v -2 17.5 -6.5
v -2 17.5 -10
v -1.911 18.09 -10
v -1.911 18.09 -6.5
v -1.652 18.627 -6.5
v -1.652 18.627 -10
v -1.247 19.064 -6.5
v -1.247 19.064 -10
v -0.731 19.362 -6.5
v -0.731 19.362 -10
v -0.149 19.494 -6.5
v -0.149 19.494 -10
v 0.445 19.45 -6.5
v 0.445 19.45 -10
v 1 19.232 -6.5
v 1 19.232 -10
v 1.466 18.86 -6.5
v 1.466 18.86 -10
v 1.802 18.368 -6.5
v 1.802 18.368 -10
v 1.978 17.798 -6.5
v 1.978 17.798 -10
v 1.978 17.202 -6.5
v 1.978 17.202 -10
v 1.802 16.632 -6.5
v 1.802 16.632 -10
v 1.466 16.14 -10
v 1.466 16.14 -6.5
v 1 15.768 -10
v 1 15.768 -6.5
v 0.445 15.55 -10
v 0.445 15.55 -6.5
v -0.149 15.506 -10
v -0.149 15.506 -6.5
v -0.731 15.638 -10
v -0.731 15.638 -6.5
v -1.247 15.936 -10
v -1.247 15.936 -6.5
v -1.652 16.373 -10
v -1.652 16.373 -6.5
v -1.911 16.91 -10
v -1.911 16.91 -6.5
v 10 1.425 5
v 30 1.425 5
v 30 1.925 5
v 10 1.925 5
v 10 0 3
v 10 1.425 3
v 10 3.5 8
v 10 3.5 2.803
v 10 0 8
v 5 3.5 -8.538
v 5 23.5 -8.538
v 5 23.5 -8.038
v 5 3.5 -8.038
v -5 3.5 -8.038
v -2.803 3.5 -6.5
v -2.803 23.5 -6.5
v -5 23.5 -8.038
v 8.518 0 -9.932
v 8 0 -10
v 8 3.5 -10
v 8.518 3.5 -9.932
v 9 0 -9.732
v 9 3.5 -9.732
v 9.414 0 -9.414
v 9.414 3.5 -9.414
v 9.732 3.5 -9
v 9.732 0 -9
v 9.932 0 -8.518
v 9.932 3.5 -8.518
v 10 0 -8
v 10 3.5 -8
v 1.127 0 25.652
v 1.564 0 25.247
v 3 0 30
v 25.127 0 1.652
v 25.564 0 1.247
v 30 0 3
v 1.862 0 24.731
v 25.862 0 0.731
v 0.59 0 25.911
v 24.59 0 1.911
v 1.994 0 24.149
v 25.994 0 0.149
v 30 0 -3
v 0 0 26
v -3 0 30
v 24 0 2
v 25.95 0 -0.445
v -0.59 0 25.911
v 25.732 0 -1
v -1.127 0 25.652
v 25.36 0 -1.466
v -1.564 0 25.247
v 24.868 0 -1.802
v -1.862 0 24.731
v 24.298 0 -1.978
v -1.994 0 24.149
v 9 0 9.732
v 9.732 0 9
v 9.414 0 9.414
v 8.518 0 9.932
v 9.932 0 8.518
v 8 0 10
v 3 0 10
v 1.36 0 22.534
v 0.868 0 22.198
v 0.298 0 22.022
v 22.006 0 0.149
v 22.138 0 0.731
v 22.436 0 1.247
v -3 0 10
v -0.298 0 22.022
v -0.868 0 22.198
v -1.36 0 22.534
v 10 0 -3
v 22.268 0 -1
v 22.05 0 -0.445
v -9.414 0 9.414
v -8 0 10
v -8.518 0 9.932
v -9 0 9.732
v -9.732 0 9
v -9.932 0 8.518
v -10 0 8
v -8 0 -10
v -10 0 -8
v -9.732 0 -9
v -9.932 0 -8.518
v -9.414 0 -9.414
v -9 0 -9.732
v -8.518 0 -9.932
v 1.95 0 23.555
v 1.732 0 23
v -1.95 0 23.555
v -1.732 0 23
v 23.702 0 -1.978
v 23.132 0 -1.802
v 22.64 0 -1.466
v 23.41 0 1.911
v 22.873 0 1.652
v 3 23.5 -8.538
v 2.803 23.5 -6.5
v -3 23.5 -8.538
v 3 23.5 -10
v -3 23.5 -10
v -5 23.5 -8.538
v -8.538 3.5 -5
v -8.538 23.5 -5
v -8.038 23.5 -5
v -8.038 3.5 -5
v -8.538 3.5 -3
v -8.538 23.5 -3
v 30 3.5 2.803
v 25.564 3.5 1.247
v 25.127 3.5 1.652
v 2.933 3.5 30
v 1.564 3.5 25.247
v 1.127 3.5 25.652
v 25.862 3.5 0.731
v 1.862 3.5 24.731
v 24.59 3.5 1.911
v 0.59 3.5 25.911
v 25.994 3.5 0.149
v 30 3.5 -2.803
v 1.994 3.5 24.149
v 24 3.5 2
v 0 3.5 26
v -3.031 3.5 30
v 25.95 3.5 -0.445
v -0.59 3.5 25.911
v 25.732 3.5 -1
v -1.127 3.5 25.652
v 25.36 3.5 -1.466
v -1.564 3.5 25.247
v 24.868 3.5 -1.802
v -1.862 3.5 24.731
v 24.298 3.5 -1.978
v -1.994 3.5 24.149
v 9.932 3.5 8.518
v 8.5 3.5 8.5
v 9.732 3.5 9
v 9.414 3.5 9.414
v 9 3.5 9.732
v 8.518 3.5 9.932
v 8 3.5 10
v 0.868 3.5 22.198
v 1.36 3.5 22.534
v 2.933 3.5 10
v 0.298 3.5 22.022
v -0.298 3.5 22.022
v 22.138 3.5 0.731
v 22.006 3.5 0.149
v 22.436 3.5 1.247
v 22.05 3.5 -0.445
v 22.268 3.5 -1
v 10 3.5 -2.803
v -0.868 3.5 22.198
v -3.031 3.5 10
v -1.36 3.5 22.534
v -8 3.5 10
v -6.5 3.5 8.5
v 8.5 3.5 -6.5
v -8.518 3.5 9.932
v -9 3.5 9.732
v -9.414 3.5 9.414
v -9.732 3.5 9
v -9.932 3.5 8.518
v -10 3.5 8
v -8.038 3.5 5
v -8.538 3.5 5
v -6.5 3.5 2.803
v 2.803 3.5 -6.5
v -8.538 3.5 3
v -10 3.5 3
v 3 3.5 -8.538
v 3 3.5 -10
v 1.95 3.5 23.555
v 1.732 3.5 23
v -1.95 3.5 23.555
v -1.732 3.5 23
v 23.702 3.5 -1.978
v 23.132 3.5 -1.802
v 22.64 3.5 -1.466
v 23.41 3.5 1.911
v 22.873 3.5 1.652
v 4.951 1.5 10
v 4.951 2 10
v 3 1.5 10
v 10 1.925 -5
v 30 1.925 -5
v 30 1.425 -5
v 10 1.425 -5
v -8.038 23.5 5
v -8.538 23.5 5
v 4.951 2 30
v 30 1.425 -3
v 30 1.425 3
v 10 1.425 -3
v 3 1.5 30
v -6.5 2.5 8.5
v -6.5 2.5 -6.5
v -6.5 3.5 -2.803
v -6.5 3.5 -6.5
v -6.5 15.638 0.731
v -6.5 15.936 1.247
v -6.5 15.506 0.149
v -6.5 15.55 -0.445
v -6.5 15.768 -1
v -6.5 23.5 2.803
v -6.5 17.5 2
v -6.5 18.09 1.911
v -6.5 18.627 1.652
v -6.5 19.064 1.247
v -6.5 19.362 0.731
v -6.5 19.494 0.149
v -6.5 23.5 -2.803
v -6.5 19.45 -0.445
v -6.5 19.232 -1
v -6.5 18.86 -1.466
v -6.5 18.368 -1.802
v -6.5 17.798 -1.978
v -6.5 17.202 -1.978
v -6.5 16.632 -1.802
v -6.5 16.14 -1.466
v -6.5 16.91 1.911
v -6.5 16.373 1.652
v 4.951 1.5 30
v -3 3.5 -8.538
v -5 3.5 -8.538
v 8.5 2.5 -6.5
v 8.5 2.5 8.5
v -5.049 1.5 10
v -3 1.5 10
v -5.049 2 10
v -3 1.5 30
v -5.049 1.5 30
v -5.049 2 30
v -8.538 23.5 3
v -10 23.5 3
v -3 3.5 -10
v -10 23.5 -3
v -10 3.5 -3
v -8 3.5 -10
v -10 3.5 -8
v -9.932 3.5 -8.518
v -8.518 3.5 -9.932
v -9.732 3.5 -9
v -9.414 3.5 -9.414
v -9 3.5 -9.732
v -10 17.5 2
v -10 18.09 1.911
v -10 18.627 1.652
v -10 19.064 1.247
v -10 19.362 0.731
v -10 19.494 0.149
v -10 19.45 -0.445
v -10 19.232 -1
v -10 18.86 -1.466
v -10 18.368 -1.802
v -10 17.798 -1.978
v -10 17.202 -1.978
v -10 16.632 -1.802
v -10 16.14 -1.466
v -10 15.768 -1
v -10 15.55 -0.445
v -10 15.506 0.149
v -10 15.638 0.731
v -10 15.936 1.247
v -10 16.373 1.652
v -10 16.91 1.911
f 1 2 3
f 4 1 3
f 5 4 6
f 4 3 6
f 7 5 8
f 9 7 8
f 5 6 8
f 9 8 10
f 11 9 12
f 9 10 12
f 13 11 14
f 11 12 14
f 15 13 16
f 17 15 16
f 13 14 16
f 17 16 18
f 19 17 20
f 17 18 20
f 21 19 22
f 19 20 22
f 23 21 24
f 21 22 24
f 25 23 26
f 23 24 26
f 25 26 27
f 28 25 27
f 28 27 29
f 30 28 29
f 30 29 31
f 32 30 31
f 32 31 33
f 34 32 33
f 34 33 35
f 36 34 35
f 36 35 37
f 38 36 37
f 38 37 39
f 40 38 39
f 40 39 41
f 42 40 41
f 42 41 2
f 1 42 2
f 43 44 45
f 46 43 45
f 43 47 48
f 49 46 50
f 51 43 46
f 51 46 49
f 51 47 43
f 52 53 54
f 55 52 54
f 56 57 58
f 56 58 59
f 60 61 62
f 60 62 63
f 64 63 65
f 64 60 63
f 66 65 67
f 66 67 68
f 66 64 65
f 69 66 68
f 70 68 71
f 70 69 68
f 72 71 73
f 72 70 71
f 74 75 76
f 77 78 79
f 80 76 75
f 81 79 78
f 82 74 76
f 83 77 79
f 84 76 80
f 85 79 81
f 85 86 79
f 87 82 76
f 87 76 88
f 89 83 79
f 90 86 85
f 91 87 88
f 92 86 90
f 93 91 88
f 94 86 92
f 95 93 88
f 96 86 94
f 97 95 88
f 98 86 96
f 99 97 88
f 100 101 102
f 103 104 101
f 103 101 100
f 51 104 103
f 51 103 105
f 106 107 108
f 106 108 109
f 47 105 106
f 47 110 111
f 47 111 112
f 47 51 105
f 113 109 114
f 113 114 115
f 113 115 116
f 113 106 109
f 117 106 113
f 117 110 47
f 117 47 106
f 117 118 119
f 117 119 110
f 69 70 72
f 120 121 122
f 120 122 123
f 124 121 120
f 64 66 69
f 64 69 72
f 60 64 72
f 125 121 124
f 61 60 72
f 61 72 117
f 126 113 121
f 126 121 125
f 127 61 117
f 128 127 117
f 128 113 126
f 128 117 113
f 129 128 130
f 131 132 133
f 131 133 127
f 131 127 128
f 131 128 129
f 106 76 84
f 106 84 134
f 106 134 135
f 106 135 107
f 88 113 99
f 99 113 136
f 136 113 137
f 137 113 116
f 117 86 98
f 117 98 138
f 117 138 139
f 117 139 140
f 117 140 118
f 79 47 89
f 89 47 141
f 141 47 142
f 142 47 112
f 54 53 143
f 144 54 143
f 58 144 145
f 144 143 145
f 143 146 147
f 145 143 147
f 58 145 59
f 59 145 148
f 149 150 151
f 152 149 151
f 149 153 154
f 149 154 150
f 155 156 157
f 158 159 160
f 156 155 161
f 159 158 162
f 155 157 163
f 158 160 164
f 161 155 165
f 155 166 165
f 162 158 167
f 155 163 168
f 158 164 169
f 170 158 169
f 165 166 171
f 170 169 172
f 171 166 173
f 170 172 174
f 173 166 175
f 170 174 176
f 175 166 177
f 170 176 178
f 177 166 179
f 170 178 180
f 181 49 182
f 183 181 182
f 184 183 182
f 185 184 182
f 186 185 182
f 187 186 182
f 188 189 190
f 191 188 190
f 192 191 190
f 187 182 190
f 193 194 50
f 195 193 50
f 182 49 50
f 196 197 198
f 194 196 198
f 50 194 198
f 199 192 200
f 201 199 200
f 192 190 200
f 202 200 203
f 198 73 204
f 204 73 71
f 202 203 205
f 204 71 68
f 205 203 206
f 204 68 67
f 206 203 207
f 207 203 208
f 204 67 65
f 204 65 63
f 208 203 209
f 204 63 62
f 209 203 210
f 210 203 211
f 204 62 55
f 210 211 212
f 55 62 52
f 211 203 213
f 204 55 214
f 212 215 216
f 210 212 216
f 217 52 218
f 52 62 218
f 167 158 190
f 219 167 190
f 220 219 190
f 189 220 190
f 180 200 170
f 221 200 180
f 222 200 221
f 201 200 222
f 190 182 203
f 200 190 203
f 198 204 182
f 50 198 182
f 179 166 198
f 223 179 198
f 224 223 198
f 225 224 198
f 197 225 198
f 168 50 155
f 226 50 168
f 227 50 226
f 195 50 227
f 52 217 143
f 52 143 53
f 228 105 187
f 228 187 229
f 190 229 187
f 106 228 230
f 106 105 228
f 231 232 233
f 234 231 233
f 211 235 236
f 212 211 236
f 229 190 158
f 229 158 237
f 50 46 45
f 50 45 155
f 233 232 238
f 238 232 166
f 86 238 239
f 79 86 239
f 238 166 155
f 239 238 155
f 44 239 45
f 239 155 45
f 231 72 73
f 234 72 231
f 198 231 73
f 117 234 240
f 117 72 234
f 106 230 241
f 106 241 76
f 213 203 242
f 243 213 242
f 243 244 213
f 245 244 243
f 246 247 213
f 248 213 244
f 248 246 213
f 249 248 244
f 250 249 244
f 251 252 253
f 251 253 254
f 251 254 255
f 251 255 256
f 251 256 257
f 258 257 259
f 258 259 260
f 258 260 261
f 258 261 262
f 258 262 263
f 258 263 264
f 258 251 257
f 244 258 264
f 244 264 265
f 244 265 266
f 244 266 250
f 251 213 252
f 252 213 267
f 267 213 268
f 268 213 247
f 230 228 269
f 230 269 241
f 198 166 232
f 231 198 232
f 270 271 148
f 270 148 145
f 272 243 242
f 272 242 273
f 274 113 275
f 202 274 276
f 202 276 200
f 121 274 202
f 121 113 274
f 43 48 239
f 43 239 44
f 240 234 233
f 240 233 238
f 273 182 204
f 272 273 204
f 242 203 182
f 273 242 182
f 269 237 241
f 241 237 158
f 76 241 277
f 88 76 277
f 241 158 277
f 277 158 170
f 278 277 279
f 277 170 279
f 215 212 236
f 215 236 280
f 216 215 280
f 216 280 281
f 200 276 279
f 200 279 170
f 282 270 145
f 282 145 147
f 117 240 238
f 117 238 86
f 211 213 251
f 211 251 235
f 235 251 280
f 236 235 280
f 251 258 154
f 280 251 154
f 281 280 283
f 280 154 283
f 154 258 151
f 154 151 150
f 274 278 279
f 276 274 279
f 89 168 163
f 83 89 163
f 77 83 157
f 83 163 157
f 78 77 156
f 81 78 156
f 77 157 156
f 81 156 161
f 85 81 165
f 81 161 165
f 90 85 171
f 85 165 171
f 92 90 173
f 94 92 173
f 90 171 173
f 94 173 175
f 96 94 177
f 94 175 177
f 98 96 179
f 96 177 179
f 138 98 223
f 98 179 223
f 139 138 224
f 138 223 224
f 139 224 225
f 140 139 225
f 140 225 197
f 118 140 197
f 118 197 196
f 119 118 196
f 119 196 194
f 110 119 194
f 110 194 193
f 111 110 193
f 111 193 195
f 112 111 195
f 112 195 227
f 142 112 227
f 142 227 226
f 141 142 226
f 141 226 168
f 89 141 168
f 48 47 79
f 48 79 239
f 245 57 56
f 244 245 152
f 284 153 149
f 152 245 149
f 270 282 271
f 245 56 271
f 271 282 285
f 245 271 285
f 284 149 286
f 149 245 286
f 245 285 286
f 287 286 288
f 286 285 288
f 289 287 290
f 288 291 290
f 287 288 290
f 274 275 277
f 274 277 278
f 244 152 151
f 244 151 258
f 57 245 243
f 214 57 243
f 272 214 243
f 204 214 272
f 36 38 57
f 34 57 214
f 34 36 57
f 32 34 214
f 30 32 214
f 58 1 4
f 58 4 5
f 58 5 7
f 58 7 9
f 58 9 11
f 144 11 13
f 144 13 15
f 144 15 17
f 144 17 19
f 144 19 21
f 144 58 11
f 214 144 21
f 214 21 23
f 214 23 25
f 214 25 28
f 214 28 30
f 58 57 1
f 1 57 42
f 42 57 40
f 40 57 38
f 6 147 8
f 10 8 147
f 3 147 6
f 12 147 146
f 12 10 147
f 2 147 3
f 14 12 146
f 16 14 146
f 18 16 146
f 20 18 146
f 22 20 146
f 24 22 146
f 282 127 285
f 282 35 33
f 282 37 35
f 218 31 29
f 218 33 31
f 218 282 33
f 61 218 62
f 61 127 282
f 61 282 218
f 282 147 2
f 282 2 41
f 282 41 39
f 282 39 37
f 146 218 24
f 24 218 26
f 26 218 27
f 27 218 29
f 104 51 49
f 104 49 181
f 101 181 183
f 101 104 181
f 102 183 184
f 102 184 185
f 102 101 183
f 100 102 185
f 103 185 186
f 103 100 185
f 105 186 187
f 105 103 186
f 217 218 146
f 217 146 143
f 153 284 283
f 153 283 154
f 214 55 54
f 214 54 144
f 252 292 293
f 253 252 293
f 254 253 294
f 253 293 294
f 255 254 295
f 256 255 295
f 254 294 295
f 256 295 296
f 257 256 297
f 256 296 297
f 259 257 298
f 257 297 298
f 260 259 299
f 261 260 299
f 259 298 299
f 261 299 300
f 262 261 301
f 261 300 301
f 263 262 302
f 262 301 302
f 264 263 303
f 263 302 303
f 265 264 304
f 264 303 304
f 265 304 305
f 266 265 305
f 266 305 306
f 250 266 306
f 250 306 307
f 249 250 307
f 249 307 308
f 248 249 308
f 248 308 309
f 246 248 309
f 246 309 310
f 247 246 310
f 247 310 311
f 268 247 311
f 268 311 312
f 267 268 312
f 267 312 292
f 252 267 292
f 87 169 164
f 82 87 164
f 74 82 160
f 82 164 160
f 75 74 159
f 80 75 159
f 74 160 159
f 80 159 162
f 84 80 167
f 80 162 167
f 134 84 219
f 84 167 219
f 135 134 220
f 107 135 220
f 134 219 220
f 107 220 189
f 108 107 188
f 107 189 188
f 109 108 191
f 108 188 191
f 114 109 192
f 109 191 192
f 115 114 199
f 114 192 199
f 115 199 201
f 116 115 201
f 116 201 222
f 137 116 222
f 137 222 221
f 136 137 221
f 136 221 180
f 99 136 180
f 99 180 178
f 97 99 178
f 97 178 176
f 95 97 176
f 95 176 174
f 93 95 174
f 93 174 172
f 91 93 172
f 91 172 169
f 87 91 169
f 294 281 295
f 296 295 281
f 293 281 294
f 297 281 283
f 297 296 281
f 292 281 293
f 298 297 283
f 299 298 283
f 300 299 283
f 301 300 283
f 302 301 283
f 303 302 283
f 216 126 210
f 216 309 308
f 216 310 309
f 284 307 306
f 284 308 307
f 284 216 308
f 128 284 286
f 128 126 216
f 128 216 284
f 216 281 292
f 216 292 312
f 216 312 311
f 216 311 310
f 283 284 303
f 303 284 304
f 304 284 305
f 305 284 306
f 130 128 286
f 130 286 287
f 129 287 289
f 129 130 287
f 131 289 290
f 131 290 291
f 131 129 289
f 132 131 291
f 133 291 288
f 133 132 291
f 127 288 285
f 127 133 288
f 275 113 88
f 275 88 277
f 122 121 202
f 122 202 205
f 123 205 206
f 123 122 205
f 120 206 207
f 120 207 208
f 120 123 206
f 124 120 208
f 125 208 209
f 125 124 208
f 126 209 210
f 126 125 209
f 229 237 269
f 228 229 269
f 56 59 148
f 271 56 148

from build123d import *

# Parameters (mm, degrees)
BOSS_EXTRUDE1_DEPTH = 3.5
SKETCH2_W           = 15
SKETCH2_H           = 15
CUT_EXTRUDE1_DEPTH  = 1
BOSS_EXTRUDE2_DEPTH = 20
BOSS_EXTRUDE3_DEPTH = 20
BOSS_EXTRUDE4_DEPTH = 20
SKETCH7_R           = 2
CUT_EXTRUDE3_DEPTH  = 20
SKETCH8_R           = 2
CUT_EXTRUDE4_DEPTH  = 20
SKETCH9_R           = 2
CUT_EXTRUDE5_DEPTH  = 20
SKETCH10_R          = 2
CUT_EXTRUDE6_DEPTH  = 20


with BuildPart() as part:
    # Sketch1 → Boss-Extrude1 (new body)
    with BuildSketch(Plane(origin=(0, 0, 0), x_dir=(1, 0, 0), z_dir=(0, 1, 0))):
        with BuildLine():
            Line((8, -10), (-8, -10))
            ThreePointArc((-8, -10), (-9.414213562, -9.414213562), (-10, -8))
            Line((-10, -8), (-10, 8))
            ThreePointArc((-10, 8), (-9.414213562, 9.414213562), (-8, 10))
            Line((-8, 10), (8, 10))
            ThreePointArc((8, 10), (9.414213562, 9.414213562), (10, 8))
            Line((10, 8), (10, -8))
            ThreePointArc((10, -8), (9.414213562, -9.414213562), (8, -10))
        make_face()
    extrude(amount=BOSS_EXTRUDE1_DEPTH)

    # Sketch2 → Cut-Extrude1 (cut)
    with BuildSketch(Plane(origin=(0, 3.5, 0), x_dir=(1, 0, 0), z_dir=(0, 1, 0))):
        with Locations((1, -1)):
            Rectangle(SKETCH2_W, SKETCH2_H)
    extrude(amount=-CUT_EXTRUDE1_DEPTH, mode=Mode.SUBTRACT)

    # Sketch3 → Boss-Extrude2 (add)
    with BuildSketch(Plane(origin=(0, 3.5, 0), x_dir=(1, 0, 0), z_dir=(0, 1, 0))):
        Polygon((2.803245497, 6.5), (-2.803245497, 6.5), (-5, 8.037515228), (-5, 8.537515228), (-3, 8.537515228), (-3, 10), (3, 10), (3, 8.537515228), (5, 8.537515228), (5, 8.037515228), align=None)
        Polygon((-8.537515228, 5), (-8.037515228, 5), (-6.5, 2.803245497), (-6.5, -2.803245497), (-8.037515228, -5), (-8.537515228, -5), (-8.537515228, -3), (-10, -3), (-10, 3), (-8.537515228, 3), align=None)
    extrude(amount=BOSS_EXTRUDE2_DEPTH)

    # Sketch4 → Boss-Extrude3 (add)
    with BuildSketch(Plane.XY.offset(10)):
        Polygon((2.93267729, 3.5), (4.950797873, 2), (4.950797873, 1.5), (3, 1.5), (3, 0), (-3, 0), (-3, 1.5), (-5.049202127, 1.5), (-5.049202127, 2), (-3.031081545, 3.5), align=None)
    extrude(amount=BOSS_EXTRUDE3_DEPTH)

    # Sketch5 → Boss-Extrude4 (add)
    with BuildSketch(Plane(origin=(10, 0, 0), x_dir=(0, 0, -1), z_dir=(1, 0, 0))):
        Polygon((2.803245497, 3.5), (5, 1.925227615), (5, 1.425227615), (3, 1.425227615), (3, 0), (-3, 0), (-3, 1.425227615), (-5, 1.425227615), (-5, 1.925227615), (-2.803245497, 3.5), align=None)
    extrude(amount=BOSS_EXTRUDE4_DEPTH)

    # Sketch7 → Cut-Extrude3 (cut)
    with BuildSketch(Plane.ZY.offset(10)):
        with Locations((0, 17.5)):
            Circle(SKETCH7_R)
    extrude(amount=-CUT_EXTRUDE3_DEPTH, mode=Mode.SUBTRACT)

    # Sketch8 → Cut-Extrude4 (cut)
    with BuildSketch(Plane(origin=(0, 0, -10), x_dir=(-1, 0, 0), z_dir=(0, 0, -1))):
        with Locations((0, 17.5)):
            Circle(SKETCH8_R)
    extrude(amount=-CUT_EXTRUDE4_DEPTH, mode=Mode.SUBTRACT)

    # Sketch9 → Cut-Extrude5 (cut)
    with BuildSketch(Plane(origin=(0, 3.5, 0), x_dir=(1, 0, 0), z_dir=(0, 1, 0))):
        with Locations(Location((0, -24, 0), (0, 0, 270))):
            Circle(SKETCH9_R)
    extrude(amount=-CUT_EXTRUDE5_DEPTH, mode=Mode.SUBTRACT)

    # Sketch10 → Cut-Extrude6 (cut)
    with BuildSketch(Plane(origin=(0, 3.5, 0), x_dir=(1, 0, 0), z_dir=(0, 1, 0))):
        with Locations(Location((24, 0, 0), (0, 0, 270))):
            Circle(SKETCH10_R)
    extrude(amount=-CUT_EXTRUDE6_DEPTH, mode=Mode.SUBTRACT)


solid = part.part
